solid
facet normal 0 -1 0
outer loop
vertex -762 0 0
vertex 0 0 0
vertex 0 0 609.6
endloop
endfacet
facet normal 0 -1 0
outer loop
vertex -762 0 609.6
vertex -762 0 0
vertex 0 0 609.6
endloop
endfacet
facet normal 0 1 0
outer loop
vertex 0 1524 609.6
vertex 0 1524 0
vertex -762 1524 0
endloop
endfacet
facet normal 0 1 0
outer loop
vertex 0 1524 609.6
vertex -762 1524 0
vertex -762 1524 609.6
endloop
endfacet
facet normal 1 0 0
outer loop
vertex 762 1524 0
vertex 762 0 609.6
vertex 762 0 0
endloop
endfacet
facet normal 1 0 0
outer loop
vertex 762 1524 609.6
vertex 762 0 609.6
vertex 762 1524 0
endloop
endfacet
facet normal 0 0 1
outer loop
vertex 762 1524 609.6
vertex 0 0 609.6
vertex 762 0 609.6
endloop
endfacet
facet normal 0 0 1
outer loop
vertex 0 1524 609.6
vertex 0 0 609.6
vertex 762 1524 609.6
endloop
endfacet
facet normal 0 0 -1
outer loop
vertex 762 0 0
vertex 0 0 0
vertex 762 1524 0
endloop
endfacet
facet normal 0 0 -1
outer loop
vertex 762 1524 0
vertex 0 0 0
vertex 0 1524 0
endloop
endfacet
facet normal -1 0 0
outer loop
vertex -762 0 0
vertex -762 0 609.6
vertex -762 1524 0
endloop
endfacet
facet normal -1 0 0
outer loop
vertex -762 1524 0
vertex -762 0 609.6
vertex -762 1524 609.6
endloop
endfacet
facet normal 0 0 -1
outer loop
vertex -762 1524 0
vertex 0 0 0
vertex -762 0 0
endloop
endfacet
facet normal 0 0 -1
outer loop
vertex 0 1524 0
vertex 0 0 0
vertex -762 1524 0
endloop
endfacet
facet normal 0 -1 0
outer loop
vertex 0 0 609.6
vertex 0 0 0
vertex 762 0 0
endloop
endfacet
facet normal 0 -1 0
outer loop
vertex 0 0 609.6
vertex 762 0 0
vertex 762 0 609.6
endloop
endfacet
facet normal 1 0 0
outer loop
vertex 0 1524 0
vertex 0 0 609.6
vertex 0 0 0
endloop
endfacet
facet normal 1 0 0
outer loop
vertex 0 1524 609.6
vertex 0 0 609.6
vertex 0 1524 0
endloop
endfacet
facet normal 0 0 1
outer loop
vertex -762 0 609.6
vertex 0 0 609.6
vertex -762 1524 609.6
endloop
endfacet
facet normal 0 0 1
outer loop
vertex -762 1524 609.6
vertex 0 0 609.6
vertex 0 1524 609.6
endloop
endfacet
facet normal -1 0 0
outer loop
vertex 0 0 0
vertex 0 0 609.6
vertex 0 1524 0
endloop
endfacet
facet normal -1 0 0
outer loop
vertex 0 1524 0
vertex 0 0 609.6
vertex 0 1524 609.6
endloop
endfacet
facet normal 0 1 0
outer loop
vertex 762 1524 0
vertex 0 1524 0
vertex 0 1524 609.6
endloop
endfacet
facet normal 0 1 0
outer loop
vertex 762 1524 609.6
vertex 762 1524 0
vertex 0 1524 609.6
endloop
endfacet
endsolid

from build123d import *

# Parameters (mm, degrees)
F0_W     = 1524
F0_H     = 609.6
F1_DEPTH = 762


with BuildPart() as f1:
    # F0 (on Right) → F1 (new body)
    with BuildSketch(Plane.YZ):
        with Locations((762, 304.8)):
            Rectangle(F0_W, F0_H)
    extrude(amount=F1_DEPTH)


with BuildPart() as f2_1:
    # F2: instance of F1
    add(f1.part.mirror(Plane.YZ))


solid = Compound([f1.part, f2_1.part])
